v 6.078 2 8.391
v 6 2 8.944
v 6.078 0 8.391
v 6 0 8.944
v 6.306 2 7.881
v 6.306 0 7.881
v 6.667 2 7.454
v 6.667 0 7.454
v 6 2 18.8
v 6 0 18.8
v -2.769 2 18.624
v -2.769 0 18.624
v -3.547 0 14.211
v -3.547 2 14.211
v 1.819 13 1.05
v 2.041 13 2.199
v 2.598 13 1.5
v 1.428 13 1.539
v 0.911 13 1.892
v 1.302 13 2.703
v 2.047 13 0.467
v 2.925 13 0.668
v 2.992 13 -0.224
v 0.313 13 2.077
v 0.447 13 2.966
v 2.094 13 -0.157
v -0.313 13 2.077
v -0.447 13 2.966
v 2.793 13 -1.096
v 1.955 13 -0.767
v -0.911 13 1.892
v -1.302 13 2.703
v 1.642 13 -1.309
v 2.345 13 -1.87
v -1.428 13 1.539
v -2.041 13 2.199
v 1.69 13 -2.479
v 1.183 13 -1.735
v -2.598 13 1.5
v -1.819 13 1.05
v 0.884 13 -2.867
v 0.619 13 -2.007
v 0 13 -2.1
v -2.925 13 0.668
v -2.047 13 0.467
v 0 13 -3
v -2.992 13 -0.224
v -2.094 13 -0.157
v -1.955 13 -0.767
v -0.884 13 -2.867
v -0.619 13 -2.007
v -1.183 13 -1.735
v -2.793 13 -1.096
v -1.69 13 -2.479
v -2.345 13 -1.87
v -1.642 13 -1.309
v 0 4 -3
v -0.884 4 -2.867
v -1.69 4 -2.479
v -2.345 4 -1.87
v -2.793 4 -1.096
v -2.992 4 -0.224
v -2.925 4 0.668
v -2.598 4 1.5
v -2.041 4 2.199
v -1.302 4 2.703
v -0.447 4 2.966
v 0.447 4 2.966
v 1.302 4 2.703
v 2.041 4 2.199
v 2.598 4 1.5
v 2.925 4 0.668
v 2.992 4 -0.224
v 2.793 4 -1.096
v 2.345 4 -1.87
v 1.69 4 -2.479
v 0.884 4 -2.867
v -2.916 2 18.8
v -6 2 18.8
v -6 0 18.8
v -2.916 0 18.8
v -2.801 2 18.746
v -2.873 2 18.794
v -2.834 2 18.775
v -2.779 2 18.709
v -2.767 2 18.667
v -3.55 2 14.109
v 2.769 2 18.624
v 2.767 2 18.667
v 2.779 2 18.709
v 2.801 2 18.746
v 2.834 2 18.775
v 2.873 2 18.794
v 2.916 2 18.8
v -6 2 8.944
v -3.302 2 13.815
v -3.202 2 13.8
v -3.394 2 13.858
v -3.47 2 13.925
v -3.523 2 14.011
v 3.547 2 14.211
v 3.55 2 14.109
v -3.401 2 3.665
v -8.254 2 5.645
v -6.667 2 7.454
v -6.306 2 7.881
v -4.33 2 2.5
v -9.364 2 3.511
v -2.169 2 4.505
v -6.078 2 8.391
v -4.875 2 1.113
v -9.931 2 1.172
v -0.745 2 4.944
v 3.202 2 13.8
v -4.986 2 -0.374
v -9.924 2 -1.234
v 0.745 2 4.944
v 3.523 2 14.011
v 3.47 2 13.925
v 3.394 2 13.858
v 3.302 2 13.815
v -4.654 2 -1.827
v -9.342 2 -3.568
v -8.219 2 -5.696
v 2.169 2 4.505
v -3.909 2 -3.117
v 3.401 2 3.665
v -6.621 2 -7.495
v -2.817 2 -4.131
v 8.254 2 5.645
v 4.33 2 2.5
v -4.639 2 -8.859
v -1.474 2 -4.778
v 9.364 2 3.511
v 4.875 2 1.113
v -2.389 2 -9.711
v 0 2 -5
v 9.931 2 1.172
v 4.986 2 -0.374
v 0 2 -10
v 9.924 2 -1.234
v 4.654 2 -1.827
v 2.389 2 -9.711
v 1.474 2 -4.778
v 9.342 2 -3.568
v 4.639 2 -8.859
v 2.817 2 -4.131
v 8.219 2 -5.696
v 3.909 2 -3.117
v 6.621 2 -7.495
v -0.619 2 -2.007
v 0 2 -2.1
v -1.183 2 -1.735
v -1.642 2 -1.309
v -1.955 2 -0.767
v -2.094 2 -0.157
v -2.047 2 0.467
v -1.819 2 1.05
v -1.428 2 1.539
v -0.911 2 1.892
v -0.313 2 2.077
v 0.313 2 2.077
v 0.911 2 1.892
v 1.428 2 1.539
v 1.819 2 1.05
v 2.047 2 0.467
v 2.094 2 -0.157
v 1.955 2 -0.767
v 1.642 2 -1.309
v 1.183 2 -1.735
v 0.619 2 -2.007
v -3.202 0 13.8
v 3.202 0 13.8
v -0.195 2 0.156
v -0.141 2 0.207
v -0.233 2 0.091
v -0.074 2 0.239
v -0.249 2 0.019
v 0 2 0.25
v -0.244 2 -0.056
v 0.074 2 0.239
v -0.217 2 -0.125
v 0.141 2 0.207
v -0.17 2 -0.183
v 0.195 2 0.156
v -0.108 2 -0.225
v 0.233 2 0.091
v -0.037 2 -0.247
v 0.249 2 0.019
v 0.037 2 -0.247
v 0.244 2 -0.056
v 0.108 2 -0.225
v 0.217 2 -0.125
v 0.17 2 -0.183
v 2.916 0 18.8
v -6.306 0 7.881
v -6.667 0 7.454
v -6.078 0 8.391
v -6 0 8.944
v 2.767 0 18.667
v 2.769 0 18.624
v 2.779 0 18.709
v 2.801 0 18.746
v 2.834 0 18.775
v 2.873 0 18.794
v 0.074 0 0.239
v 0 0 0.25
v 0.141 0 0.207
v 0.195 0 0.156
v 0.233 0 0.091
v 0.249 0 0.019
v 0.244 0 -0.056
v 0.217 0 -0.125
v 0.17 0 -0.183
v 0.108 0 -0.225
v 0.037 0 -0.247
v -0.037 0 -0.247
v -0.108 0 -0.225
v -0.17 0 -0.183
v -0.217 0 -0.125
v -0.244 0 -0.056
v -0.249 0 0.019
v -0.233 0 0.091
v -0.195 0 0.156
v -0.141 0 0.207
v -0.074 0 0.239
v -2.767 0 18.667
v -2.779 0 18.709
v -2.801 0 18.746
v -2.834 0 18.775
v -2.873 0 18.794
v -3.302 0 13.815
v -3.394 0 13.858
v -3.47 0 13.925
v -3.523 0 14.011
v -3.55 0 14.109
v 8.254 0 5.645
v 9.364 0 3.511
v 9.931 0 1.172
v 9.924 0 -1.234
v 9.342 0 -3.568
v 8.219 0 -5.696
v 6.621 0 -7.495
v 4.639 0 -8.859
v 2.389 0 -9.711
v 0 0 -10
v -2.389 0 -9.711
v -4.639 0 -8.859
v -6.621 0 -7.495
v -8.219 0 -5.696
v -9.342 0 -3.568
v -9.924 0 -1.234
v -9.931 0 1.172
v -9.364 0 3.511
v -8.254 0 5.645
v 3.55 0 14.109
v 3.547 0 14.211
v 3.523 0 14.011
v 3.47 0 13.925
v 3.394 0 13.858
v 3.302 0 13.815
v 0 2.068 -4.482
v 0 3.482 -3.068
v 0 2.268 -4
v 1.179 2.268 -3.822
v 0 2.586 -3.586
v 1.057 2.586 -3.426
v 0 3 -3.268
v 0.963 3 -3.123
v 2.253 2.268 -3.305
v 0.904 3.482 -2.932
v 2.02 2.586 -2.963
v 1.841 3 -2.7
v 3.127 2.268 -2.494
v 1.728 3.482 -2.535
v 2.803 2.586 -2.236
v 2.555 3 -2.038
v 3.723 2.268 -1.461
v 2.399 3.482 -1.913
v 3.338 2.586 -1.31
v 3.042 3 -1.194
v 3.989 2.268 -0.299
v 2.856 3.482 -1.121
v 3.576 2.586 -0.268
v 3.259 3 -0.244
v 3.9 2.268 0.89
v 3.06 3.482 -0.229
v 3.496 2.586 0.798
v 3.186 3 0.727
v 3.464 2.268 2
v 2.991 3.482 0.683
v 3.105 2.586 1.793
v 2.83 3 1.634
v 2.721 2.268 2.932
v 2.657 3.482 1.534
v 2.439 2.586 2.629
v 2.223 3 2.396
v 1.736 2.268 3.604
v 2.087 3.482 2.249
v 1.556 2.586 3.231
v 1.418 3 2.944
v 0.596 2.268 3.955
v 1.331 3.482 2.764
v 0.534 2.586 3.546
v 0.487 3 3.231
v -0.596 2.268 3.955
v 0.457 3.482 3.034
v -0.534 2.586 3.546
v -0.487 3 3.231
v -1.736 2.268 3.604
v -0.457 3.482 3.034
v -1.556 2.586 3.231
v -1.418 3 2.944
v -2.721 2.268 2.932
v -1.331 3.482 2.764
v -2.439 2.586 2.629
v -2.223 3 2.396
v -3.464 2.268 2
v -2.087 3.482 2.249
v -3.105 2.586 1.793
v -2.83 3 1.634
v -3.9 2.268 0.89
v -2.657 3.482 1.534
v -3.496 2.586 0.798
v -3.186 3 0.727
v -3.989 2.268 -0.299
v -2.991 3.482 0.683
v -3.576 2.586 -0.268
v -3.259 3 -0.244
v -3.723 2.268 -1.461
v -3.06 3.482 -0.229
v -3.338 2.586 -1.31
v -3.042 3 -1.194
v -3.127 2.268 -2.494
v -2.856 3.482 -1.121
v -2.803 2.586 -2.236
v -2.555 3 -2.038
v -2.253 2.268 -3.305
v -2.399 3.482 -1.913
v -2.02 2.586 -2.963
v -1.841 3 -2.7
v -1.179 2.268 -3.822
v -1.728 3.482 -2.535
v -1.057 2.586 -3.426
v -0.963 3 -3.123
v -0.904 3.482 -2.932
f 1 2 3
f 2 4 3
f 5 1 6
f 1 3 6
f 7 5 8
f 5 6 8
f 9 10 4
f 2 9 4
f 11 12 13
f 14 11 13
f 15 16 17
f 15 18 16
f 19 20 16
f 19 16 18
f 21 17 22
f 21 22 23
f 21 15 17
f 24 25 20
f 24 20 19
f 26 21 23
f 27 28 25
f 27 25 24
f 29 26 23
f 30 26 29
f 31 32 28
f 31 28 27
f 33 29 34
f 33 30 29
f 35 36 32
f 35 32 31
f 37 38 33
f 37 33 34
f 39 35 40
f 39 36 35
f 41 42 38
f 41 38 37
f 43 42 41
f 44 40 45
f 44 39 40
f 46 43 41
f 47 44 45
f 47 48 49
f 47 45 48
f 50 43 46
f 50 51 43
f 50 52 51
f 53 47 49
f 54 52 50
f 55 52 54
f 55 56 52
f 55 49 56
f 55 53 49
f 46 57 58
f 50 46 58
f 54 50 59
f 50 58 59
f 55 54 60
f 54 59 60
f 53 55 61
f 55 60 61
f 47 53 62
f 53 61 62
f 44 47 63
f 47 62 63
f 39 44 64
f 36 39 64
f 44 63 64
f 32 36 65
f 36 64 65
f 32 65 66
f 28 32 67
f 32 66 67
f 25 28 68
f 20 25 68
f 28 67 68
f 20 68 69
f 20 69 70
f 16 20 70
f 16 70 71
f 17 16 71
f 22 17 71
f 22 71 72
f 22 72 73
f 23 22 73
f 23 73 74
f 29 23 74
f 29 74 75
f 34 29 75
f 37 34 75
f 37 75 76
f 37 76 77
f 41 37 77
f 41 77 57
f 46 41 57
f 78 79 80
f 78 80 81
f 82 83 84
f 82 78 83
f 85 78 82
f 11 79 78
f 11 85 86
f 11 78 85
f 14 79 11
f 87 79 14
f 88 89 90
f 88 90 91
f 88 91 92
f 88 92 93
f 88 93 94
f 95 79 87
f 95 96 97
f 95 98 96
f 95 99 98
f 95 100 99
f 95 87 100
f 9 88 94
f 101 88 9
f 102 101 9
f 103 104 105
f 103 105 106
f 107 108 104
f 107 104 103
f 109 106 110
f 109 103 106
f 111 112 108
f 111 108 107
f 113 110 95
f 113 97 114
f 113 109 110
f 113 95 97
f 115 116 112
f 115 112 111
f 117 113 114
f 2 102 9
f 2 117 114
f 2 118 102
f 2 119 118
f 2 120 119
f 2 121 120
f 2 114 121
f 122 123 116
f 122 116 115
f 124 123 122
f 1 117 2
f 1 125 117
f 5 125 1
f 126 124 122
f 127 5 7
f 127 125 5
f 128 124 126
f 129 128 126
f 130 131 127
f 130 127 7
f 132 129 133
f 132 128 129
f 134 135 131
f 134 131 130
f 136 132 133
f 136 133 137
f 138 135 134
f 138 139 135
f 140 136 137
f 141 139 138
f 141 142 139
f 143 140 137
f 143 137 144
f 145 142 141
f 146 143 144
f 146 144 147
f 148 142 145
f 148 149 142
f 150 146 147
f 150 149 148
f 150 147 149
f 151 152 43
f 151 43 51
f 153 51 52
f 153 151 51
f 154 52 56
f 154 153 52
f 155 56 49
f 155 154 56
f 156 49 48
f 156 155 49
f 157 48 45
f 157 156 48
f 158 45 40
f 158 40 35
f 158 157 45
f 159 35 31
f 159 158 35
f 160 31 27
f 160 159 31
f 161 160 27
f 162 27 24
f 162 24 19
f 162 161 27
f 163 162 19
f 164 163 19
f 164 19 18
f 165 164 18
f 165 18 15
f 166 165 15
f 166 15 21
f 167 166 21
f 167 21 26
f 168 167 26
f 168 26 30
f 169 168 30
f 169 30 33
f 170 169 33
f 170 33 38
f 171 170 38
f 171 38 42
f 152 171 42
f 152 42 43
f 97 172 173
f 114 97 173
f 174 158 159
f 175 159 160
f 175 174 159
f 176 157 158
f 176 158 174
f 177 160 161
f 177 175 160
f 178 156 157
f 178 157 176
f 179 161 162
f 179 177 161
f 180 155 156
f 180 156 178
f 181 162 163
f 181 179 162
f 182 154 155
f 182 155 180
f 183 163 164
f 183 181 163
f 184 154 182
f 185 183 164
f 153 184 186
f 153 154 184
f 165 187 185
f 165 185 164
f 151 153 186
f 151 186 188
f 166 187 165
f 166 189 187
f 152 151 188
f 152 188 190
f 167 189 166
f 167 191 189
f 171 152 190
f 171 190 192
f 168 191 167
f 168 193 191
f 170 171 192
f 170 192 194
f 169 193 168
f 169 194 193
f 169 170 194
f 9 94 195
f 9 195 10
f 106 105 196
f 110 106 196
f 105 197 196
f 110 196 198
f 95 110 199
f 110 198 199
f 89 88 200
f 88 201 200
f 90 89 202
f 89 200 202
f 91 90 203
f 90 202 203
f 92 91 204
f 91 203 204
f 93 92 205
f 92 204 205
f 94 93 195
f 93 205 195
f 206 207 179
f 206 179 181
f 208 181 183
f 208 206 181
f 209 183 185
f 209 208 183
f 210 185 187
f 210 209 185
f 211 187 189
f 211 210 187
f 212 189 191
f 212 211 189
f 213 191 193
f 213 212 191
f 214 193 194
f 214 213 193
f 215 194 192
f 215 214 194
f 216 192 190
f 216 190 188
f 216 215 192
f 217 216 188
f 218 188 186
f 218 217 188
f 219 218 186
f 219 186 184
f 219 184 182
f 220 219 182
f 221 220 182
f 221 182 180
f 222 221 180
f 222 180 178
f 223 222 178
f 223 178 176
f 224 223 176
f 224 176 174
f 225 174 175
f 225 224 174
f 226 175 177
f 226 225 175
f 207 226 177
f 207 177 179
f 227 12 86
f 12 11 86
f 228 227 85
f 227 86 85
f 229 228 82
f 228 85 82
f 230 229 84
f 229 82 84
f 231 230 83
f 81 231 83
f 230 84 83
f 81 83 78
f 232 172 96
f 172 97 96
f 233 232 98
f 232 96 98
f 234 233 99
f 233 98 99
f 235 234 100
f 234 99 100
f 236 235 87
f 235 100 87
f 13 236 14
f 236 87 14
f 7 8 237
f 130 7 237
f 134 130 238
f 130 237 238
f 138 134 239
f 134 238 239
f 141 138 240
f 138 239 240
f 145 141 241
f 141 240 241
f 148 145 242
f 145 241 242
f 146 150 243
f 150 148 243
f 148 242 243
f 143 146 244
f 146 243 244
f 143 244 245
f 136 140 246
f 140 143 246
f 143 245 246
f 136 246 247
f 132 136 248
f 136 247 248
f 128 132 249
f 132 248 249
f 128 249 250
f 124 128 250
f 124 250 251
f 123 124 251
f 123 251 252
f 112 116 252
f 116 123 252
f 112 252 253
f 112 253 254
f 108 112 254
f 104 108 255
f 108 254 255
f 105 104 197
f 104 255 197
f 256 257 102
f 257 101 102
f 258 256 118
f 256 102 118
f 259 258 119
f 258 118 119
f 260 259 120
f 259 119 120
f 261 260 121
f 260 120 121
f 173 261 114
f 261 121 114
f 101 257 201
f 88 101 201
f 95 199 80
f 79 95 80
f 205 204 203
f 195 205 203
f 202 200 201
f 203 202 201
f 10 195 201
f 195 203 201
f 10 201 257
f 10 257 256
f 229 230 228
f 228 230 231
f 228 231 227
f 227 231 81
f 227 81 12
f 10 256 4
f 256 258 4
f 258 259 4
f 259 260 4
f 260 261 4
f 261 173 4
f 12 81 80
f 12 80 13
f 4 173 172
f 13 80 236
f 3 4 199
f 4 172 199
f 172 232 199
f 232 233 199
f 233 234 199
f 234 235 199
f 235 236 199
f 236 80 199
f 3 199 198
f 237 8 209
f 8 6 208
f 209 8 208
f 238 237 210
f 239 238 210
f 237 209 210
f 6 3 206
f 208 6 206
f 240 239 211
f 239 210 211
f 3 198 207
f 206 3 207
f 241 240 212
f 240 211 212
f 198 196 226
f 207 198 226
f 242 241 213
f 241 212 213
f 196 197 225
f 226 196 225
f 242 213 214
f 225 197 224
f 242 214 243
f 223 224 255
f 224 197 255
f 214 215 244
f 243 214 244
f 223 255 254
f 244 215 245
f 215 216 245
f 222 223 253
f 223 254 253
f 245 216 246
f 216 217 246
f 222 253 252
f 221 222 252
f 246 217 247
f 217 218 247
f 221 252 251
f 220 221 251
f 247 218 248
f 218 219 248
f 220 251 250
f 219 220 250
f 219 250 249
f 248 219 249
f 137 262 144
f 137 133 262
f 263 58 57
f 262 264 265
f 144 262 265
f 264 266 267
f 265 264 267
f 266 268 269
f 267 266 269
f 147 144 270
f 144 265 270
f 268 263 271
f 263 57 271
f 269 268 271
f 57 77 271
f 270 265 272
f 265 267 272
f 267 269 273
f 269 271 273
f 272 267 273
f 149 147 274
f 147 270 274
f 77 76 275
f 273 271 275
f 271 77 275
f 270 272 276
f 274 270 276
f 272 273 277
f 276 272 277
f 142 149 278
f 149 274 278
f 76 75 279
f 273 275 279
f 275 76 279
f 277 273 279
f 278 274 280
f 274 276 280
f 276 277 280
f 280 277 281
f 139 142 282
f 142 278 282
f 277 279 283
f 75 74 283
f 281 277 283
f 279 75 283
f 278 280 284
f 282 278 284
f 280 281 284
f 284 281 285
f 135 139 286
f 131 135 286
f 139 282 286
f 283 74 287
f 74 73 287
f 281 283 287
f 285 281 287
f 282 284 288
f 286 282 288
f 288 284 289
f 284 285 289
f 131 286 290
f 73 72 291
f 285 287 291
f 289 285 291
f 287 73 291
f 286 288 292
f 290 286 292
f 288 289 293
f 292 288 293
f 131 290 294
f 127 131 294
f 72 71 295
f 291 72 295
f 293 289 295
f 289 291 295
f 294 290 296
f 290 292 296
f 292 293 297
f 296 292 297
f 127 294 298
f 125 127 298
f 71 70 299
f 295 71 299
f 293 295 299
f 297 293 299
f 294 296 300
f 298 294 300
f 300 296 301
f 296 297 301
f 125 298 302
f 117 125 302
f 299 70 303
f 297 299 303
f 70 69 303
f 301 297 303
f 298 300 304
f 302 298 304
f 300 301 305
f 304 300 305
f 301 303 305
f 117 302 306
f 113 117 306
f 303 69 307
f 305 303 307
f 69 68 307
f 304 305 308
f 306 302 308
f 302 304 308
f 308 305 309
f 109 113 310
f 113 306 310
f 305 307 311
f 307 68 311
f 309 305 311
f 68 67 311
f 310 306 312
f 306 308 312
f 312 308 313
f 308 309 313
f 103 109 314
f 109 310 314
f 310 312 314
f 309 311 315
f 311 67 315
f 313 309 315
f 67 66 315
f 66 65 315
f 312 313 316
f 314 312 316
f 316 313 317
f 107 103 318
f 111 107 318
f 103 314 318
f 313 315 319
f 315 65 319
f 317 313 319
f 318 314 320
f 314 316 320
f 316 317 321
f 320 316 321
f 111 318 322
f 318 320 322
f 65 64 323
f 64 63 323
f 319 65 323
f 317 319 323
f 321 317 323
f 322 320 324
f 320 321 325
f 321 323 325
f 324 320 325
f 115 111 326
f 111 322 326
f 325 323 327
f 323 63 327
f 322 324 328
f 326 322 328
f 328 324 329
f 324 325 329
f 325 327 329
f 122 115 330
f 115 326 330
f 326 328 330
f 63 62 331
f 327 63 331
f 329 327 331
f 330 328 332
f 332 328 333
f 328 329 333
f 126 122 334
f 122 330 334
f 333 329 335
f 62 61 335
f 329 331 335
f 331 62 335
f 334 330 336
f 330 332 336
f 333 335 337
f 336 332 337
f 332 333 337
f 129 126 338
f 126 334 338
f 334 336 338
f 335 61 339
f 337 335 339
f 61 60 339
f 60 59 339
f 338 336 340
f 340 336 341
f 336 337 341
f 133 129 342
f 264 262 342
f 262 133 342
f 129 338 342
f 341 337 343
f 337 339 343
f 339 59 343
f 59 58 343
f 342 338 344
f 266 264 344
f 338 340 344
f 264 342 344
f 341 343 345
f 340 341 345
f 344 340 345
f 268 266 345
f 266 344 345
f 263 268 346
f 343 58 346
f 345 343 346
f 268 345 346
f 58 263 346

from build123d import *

# Parameters (mm, degrees)
SKETCH1_R           = 0.25
BOSS_EXTRUDE1_DEPTH = 2
SKETCH2_R           = 10
SKETCH2_R_2         = 3
BOSS_EXTRUDE2_DEPTH = 2
SKETCH4_W           = 12
SKETCH4_H           = 0.2
CUT_EXTRUDE1_DEPTH  = 4
FILLET3_R           = 0.35
FILLET4_R           = 0.15
SKETCH5_R           = 3
SKETCH5_R_2         = 2.1
BOSS_EXTRUDE4_DEPTH = 13
FILLET5_R           = 2
FILLET6_R           = 2


with BuildPart() as part:
    # Sketch1 → Boss-Extrude1 (new body)
    with BuildSketch(Plane(origin=(0, 0, 0), x_dir=(1, 0, 0), z_dir=(0, 1, 0))):
        Polygon((-6, 6), (-6, -13.291502622), (-6, -19), (-2.70227506, -19), (-3.619175359, -13.8), (0, -13.8), (3.619175359, -13.8), (2.70227506, -19), (6, -19), (6, -13.291502622), (6, 6), align=None)
        with Locations(Location((0, 0, 0), (0, 0, 270))):
            Circle(SKETCH1_R, mode=Mode.SUBTRACT)
    extrude(amount=BOSS_EXTRUDE1_DEPTH)

    # Sketch2 → Boss-Extrude2 (add)
    with BuildSketch(Plane(origin=(0, 0, 0), x_dir=(1, 0, 0), z_dir=(0, 1, 0))):
        Circle(SKETCH2_R)
        Circle(SKETCH2_R_2, mode=Mode.SUBTRACT)
    extrude(amount=BOSS_EXTRUDE2_DEPTH)

    # Sketch4 → Cut-Extrude1 (cut)
    with BuildSketch(Plane(origin=(0, 2, 0), x_dir=(1, 0, 0), z_dir=(0, 1, 0))):
        with Locations((0, -18.9)):
            Rectangle(SKETCH4_W, SKETCH4_H)
    extrude(amount=-CUT_EXTRUDE1_DEPTH, mode=Mode.SUBTRACT)

    # Fillet3
    fillet3_edges = [part.edges().sort_by_distance(p)[0] for p in [
        (3.619175359, 1, 13.8),
        (-3.619175359, 1, 13.8),
    ]]
    fillet(fillet3_edges, radius=FILLET3_R)

    # Fillet4
    fillet4_edges = [part.edges().sort_by_distance(p)[0] for p in [
        (2.737540456, 1, 18.8),
        (-2.737540456, 1, 18.8),
    ]]
    fillet(fillet4_edges, radius=FILLET4_R)

    # Sketch5 → Boss-Extrude4 (add)
    with BuildSketch(Plane(origin=(0, 0, 0), x_dir=(1, 0, 0), z_dir=(0, 1, 0))):
        with Locations(Location((0, 0, 0), (0, 0, 90))):
            Circle(SKETCH5_R)
        with Locations(Location((0, 0, 0), (0, 0, 90))):
            Circle(SKETCH5_R_2, mode=Mode.SUBTRACT)
    extrude(amount=BOSS_EXTRUDE4_DEPTH)

    # Fillet5
    fillet5_edges = [part.edges().sort_by_distance(p)[0] for p in [
        (0, 2, 3),
    ]]
    fillet(fillet5_edges, radius=FILLET5_R)

    # Fillet6
    fillet6_edges = [part.edges().sort_by_distance(p)[0] for p in [
        (6, 1, 8),
        (-6, 1, 8),
    ]]
    fillet(fillet6_edges, radius=FILLET6_R)


solid = part.part
